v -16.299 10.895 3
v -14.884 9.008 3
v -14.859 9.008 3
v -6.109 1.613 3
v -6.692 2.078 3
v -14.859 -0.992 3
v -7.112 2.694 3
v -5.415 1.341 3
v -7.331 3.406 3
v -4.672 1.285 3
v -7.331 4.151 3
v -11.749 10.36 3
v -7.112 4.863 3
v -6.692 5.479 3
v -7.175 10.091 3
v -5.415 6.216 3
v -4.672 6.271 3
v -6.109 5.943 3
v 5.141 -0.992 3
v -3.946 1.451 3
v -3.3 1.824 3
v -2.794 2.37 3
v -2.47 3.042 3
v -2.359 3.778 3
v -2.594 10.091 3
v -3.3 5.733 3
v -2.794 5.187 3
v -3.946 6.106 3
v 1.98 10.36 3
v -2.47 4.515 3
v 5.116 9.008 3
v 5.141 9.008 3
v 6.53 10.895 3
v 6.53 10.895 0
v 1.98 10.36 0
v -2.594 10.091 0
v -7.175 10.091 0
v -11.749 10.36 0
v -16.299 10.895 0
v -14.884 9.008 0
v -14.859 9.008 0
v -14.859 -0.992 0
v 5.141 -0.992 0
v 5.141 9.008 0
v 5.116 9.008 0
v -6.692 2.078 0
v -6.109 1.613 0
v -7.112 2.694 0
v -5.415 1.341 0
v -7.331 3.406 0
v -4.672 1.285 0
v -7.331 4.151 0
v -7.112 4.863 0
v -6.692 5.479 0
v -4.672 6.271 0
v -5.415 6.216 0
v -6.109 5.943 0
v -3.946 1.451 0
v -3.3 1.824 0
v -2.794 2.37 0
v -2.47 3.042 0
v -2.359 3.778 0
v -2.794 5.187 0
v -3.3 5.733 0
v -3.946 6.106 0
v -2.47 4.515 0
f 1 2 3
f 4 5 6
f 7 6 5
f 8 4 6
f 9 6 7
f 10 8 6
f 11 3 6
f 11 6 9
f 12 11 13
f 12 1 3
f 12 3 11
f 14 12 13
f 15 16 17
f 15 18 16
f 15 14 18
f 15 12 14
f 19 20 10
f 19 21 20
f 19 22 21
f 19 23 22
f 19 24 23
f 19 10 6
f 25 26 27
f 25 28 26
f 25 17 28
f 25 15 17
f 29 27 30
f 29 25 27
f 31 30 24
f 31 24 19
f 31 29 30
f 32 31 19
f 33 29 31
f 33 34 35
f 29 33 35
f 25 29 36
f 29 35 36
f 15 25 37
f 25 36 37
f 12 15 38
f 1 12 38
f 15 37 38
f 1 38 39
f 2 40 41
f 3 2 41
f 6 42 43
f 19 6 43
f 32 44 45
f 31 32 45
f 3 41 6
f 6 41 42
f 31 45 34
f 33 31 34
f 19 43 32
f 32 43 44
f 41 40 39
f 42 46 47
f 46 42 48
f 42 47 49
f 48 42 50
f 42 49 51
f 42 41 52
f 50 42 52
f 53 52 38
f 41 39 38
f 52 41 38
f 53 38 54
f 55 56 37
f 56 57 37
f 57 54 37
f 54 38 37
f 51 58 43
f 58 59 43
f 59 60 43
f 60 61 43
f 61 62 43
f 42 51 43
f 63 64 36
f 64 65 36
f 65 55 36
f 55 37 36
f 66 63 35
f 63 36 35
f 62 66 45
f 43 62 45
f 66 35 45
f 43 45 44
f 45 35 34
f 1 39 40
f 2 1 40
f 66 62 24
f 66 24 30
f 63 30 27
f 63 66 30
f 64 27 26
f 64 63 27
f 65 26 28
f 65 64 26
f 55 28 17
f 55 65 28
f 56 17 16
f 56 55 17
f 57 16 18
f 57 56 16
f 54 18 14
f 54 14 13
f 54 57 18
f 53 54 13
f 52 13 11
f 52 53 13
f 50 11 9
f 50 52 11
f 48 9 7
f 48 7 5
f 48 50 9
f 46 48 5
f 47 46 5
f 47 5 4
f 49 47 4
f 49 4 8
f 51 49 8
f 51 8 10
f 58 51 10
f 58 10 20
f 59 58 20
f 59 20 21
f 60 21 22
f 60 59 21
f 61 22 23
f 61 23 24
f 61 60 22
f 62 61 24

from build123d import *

# Parameters (mm, degrees)
F0_R     = 2.5
F1_DEPTH = 3


# Not quite as in the source:
# - a feature names something its author has since deleted; it is built from what else it names


with BuildPart() as f1:
    # F0 (on Top) → F1 (new body)
    with BuildSketch(Plane.XY):
        with BuildLine():
            Line((-14.8844467476, 9.0084131807), (-14.8591619832, 9.0084131807))
            Line((-14.8591619832, 9.0084131807), (5.1155532524, 9.0084131807))
            Line((5.1155532524, 9.0084131807), (6.5302648152, 10.8946952644))
            ThreePointArc((6.5302648152, 10.8946952644), (-4.8844467476, 10.0579512552), (-16.2991583104, 10.8946952644))
            Line((-16.2991583104, 10.8946952644), (-14.8844467476, 9.0084131807))
        make_face()
        Polygon((5.1155532524, 9.0084131807), (-14.8591619832, 9.0084131807), (-14.8591619832, -0.9915868193), (5.1408380168, -0.9915868193), (5.1408380168, 9.0084131807), align=None)
        with Locations((-4.8591619832, 3.7784131807)):
            Circle(F0_R, mode=Mode.SUBTRACT)
    extrude(amount=F1_DEPTH)


solid = f1.part
